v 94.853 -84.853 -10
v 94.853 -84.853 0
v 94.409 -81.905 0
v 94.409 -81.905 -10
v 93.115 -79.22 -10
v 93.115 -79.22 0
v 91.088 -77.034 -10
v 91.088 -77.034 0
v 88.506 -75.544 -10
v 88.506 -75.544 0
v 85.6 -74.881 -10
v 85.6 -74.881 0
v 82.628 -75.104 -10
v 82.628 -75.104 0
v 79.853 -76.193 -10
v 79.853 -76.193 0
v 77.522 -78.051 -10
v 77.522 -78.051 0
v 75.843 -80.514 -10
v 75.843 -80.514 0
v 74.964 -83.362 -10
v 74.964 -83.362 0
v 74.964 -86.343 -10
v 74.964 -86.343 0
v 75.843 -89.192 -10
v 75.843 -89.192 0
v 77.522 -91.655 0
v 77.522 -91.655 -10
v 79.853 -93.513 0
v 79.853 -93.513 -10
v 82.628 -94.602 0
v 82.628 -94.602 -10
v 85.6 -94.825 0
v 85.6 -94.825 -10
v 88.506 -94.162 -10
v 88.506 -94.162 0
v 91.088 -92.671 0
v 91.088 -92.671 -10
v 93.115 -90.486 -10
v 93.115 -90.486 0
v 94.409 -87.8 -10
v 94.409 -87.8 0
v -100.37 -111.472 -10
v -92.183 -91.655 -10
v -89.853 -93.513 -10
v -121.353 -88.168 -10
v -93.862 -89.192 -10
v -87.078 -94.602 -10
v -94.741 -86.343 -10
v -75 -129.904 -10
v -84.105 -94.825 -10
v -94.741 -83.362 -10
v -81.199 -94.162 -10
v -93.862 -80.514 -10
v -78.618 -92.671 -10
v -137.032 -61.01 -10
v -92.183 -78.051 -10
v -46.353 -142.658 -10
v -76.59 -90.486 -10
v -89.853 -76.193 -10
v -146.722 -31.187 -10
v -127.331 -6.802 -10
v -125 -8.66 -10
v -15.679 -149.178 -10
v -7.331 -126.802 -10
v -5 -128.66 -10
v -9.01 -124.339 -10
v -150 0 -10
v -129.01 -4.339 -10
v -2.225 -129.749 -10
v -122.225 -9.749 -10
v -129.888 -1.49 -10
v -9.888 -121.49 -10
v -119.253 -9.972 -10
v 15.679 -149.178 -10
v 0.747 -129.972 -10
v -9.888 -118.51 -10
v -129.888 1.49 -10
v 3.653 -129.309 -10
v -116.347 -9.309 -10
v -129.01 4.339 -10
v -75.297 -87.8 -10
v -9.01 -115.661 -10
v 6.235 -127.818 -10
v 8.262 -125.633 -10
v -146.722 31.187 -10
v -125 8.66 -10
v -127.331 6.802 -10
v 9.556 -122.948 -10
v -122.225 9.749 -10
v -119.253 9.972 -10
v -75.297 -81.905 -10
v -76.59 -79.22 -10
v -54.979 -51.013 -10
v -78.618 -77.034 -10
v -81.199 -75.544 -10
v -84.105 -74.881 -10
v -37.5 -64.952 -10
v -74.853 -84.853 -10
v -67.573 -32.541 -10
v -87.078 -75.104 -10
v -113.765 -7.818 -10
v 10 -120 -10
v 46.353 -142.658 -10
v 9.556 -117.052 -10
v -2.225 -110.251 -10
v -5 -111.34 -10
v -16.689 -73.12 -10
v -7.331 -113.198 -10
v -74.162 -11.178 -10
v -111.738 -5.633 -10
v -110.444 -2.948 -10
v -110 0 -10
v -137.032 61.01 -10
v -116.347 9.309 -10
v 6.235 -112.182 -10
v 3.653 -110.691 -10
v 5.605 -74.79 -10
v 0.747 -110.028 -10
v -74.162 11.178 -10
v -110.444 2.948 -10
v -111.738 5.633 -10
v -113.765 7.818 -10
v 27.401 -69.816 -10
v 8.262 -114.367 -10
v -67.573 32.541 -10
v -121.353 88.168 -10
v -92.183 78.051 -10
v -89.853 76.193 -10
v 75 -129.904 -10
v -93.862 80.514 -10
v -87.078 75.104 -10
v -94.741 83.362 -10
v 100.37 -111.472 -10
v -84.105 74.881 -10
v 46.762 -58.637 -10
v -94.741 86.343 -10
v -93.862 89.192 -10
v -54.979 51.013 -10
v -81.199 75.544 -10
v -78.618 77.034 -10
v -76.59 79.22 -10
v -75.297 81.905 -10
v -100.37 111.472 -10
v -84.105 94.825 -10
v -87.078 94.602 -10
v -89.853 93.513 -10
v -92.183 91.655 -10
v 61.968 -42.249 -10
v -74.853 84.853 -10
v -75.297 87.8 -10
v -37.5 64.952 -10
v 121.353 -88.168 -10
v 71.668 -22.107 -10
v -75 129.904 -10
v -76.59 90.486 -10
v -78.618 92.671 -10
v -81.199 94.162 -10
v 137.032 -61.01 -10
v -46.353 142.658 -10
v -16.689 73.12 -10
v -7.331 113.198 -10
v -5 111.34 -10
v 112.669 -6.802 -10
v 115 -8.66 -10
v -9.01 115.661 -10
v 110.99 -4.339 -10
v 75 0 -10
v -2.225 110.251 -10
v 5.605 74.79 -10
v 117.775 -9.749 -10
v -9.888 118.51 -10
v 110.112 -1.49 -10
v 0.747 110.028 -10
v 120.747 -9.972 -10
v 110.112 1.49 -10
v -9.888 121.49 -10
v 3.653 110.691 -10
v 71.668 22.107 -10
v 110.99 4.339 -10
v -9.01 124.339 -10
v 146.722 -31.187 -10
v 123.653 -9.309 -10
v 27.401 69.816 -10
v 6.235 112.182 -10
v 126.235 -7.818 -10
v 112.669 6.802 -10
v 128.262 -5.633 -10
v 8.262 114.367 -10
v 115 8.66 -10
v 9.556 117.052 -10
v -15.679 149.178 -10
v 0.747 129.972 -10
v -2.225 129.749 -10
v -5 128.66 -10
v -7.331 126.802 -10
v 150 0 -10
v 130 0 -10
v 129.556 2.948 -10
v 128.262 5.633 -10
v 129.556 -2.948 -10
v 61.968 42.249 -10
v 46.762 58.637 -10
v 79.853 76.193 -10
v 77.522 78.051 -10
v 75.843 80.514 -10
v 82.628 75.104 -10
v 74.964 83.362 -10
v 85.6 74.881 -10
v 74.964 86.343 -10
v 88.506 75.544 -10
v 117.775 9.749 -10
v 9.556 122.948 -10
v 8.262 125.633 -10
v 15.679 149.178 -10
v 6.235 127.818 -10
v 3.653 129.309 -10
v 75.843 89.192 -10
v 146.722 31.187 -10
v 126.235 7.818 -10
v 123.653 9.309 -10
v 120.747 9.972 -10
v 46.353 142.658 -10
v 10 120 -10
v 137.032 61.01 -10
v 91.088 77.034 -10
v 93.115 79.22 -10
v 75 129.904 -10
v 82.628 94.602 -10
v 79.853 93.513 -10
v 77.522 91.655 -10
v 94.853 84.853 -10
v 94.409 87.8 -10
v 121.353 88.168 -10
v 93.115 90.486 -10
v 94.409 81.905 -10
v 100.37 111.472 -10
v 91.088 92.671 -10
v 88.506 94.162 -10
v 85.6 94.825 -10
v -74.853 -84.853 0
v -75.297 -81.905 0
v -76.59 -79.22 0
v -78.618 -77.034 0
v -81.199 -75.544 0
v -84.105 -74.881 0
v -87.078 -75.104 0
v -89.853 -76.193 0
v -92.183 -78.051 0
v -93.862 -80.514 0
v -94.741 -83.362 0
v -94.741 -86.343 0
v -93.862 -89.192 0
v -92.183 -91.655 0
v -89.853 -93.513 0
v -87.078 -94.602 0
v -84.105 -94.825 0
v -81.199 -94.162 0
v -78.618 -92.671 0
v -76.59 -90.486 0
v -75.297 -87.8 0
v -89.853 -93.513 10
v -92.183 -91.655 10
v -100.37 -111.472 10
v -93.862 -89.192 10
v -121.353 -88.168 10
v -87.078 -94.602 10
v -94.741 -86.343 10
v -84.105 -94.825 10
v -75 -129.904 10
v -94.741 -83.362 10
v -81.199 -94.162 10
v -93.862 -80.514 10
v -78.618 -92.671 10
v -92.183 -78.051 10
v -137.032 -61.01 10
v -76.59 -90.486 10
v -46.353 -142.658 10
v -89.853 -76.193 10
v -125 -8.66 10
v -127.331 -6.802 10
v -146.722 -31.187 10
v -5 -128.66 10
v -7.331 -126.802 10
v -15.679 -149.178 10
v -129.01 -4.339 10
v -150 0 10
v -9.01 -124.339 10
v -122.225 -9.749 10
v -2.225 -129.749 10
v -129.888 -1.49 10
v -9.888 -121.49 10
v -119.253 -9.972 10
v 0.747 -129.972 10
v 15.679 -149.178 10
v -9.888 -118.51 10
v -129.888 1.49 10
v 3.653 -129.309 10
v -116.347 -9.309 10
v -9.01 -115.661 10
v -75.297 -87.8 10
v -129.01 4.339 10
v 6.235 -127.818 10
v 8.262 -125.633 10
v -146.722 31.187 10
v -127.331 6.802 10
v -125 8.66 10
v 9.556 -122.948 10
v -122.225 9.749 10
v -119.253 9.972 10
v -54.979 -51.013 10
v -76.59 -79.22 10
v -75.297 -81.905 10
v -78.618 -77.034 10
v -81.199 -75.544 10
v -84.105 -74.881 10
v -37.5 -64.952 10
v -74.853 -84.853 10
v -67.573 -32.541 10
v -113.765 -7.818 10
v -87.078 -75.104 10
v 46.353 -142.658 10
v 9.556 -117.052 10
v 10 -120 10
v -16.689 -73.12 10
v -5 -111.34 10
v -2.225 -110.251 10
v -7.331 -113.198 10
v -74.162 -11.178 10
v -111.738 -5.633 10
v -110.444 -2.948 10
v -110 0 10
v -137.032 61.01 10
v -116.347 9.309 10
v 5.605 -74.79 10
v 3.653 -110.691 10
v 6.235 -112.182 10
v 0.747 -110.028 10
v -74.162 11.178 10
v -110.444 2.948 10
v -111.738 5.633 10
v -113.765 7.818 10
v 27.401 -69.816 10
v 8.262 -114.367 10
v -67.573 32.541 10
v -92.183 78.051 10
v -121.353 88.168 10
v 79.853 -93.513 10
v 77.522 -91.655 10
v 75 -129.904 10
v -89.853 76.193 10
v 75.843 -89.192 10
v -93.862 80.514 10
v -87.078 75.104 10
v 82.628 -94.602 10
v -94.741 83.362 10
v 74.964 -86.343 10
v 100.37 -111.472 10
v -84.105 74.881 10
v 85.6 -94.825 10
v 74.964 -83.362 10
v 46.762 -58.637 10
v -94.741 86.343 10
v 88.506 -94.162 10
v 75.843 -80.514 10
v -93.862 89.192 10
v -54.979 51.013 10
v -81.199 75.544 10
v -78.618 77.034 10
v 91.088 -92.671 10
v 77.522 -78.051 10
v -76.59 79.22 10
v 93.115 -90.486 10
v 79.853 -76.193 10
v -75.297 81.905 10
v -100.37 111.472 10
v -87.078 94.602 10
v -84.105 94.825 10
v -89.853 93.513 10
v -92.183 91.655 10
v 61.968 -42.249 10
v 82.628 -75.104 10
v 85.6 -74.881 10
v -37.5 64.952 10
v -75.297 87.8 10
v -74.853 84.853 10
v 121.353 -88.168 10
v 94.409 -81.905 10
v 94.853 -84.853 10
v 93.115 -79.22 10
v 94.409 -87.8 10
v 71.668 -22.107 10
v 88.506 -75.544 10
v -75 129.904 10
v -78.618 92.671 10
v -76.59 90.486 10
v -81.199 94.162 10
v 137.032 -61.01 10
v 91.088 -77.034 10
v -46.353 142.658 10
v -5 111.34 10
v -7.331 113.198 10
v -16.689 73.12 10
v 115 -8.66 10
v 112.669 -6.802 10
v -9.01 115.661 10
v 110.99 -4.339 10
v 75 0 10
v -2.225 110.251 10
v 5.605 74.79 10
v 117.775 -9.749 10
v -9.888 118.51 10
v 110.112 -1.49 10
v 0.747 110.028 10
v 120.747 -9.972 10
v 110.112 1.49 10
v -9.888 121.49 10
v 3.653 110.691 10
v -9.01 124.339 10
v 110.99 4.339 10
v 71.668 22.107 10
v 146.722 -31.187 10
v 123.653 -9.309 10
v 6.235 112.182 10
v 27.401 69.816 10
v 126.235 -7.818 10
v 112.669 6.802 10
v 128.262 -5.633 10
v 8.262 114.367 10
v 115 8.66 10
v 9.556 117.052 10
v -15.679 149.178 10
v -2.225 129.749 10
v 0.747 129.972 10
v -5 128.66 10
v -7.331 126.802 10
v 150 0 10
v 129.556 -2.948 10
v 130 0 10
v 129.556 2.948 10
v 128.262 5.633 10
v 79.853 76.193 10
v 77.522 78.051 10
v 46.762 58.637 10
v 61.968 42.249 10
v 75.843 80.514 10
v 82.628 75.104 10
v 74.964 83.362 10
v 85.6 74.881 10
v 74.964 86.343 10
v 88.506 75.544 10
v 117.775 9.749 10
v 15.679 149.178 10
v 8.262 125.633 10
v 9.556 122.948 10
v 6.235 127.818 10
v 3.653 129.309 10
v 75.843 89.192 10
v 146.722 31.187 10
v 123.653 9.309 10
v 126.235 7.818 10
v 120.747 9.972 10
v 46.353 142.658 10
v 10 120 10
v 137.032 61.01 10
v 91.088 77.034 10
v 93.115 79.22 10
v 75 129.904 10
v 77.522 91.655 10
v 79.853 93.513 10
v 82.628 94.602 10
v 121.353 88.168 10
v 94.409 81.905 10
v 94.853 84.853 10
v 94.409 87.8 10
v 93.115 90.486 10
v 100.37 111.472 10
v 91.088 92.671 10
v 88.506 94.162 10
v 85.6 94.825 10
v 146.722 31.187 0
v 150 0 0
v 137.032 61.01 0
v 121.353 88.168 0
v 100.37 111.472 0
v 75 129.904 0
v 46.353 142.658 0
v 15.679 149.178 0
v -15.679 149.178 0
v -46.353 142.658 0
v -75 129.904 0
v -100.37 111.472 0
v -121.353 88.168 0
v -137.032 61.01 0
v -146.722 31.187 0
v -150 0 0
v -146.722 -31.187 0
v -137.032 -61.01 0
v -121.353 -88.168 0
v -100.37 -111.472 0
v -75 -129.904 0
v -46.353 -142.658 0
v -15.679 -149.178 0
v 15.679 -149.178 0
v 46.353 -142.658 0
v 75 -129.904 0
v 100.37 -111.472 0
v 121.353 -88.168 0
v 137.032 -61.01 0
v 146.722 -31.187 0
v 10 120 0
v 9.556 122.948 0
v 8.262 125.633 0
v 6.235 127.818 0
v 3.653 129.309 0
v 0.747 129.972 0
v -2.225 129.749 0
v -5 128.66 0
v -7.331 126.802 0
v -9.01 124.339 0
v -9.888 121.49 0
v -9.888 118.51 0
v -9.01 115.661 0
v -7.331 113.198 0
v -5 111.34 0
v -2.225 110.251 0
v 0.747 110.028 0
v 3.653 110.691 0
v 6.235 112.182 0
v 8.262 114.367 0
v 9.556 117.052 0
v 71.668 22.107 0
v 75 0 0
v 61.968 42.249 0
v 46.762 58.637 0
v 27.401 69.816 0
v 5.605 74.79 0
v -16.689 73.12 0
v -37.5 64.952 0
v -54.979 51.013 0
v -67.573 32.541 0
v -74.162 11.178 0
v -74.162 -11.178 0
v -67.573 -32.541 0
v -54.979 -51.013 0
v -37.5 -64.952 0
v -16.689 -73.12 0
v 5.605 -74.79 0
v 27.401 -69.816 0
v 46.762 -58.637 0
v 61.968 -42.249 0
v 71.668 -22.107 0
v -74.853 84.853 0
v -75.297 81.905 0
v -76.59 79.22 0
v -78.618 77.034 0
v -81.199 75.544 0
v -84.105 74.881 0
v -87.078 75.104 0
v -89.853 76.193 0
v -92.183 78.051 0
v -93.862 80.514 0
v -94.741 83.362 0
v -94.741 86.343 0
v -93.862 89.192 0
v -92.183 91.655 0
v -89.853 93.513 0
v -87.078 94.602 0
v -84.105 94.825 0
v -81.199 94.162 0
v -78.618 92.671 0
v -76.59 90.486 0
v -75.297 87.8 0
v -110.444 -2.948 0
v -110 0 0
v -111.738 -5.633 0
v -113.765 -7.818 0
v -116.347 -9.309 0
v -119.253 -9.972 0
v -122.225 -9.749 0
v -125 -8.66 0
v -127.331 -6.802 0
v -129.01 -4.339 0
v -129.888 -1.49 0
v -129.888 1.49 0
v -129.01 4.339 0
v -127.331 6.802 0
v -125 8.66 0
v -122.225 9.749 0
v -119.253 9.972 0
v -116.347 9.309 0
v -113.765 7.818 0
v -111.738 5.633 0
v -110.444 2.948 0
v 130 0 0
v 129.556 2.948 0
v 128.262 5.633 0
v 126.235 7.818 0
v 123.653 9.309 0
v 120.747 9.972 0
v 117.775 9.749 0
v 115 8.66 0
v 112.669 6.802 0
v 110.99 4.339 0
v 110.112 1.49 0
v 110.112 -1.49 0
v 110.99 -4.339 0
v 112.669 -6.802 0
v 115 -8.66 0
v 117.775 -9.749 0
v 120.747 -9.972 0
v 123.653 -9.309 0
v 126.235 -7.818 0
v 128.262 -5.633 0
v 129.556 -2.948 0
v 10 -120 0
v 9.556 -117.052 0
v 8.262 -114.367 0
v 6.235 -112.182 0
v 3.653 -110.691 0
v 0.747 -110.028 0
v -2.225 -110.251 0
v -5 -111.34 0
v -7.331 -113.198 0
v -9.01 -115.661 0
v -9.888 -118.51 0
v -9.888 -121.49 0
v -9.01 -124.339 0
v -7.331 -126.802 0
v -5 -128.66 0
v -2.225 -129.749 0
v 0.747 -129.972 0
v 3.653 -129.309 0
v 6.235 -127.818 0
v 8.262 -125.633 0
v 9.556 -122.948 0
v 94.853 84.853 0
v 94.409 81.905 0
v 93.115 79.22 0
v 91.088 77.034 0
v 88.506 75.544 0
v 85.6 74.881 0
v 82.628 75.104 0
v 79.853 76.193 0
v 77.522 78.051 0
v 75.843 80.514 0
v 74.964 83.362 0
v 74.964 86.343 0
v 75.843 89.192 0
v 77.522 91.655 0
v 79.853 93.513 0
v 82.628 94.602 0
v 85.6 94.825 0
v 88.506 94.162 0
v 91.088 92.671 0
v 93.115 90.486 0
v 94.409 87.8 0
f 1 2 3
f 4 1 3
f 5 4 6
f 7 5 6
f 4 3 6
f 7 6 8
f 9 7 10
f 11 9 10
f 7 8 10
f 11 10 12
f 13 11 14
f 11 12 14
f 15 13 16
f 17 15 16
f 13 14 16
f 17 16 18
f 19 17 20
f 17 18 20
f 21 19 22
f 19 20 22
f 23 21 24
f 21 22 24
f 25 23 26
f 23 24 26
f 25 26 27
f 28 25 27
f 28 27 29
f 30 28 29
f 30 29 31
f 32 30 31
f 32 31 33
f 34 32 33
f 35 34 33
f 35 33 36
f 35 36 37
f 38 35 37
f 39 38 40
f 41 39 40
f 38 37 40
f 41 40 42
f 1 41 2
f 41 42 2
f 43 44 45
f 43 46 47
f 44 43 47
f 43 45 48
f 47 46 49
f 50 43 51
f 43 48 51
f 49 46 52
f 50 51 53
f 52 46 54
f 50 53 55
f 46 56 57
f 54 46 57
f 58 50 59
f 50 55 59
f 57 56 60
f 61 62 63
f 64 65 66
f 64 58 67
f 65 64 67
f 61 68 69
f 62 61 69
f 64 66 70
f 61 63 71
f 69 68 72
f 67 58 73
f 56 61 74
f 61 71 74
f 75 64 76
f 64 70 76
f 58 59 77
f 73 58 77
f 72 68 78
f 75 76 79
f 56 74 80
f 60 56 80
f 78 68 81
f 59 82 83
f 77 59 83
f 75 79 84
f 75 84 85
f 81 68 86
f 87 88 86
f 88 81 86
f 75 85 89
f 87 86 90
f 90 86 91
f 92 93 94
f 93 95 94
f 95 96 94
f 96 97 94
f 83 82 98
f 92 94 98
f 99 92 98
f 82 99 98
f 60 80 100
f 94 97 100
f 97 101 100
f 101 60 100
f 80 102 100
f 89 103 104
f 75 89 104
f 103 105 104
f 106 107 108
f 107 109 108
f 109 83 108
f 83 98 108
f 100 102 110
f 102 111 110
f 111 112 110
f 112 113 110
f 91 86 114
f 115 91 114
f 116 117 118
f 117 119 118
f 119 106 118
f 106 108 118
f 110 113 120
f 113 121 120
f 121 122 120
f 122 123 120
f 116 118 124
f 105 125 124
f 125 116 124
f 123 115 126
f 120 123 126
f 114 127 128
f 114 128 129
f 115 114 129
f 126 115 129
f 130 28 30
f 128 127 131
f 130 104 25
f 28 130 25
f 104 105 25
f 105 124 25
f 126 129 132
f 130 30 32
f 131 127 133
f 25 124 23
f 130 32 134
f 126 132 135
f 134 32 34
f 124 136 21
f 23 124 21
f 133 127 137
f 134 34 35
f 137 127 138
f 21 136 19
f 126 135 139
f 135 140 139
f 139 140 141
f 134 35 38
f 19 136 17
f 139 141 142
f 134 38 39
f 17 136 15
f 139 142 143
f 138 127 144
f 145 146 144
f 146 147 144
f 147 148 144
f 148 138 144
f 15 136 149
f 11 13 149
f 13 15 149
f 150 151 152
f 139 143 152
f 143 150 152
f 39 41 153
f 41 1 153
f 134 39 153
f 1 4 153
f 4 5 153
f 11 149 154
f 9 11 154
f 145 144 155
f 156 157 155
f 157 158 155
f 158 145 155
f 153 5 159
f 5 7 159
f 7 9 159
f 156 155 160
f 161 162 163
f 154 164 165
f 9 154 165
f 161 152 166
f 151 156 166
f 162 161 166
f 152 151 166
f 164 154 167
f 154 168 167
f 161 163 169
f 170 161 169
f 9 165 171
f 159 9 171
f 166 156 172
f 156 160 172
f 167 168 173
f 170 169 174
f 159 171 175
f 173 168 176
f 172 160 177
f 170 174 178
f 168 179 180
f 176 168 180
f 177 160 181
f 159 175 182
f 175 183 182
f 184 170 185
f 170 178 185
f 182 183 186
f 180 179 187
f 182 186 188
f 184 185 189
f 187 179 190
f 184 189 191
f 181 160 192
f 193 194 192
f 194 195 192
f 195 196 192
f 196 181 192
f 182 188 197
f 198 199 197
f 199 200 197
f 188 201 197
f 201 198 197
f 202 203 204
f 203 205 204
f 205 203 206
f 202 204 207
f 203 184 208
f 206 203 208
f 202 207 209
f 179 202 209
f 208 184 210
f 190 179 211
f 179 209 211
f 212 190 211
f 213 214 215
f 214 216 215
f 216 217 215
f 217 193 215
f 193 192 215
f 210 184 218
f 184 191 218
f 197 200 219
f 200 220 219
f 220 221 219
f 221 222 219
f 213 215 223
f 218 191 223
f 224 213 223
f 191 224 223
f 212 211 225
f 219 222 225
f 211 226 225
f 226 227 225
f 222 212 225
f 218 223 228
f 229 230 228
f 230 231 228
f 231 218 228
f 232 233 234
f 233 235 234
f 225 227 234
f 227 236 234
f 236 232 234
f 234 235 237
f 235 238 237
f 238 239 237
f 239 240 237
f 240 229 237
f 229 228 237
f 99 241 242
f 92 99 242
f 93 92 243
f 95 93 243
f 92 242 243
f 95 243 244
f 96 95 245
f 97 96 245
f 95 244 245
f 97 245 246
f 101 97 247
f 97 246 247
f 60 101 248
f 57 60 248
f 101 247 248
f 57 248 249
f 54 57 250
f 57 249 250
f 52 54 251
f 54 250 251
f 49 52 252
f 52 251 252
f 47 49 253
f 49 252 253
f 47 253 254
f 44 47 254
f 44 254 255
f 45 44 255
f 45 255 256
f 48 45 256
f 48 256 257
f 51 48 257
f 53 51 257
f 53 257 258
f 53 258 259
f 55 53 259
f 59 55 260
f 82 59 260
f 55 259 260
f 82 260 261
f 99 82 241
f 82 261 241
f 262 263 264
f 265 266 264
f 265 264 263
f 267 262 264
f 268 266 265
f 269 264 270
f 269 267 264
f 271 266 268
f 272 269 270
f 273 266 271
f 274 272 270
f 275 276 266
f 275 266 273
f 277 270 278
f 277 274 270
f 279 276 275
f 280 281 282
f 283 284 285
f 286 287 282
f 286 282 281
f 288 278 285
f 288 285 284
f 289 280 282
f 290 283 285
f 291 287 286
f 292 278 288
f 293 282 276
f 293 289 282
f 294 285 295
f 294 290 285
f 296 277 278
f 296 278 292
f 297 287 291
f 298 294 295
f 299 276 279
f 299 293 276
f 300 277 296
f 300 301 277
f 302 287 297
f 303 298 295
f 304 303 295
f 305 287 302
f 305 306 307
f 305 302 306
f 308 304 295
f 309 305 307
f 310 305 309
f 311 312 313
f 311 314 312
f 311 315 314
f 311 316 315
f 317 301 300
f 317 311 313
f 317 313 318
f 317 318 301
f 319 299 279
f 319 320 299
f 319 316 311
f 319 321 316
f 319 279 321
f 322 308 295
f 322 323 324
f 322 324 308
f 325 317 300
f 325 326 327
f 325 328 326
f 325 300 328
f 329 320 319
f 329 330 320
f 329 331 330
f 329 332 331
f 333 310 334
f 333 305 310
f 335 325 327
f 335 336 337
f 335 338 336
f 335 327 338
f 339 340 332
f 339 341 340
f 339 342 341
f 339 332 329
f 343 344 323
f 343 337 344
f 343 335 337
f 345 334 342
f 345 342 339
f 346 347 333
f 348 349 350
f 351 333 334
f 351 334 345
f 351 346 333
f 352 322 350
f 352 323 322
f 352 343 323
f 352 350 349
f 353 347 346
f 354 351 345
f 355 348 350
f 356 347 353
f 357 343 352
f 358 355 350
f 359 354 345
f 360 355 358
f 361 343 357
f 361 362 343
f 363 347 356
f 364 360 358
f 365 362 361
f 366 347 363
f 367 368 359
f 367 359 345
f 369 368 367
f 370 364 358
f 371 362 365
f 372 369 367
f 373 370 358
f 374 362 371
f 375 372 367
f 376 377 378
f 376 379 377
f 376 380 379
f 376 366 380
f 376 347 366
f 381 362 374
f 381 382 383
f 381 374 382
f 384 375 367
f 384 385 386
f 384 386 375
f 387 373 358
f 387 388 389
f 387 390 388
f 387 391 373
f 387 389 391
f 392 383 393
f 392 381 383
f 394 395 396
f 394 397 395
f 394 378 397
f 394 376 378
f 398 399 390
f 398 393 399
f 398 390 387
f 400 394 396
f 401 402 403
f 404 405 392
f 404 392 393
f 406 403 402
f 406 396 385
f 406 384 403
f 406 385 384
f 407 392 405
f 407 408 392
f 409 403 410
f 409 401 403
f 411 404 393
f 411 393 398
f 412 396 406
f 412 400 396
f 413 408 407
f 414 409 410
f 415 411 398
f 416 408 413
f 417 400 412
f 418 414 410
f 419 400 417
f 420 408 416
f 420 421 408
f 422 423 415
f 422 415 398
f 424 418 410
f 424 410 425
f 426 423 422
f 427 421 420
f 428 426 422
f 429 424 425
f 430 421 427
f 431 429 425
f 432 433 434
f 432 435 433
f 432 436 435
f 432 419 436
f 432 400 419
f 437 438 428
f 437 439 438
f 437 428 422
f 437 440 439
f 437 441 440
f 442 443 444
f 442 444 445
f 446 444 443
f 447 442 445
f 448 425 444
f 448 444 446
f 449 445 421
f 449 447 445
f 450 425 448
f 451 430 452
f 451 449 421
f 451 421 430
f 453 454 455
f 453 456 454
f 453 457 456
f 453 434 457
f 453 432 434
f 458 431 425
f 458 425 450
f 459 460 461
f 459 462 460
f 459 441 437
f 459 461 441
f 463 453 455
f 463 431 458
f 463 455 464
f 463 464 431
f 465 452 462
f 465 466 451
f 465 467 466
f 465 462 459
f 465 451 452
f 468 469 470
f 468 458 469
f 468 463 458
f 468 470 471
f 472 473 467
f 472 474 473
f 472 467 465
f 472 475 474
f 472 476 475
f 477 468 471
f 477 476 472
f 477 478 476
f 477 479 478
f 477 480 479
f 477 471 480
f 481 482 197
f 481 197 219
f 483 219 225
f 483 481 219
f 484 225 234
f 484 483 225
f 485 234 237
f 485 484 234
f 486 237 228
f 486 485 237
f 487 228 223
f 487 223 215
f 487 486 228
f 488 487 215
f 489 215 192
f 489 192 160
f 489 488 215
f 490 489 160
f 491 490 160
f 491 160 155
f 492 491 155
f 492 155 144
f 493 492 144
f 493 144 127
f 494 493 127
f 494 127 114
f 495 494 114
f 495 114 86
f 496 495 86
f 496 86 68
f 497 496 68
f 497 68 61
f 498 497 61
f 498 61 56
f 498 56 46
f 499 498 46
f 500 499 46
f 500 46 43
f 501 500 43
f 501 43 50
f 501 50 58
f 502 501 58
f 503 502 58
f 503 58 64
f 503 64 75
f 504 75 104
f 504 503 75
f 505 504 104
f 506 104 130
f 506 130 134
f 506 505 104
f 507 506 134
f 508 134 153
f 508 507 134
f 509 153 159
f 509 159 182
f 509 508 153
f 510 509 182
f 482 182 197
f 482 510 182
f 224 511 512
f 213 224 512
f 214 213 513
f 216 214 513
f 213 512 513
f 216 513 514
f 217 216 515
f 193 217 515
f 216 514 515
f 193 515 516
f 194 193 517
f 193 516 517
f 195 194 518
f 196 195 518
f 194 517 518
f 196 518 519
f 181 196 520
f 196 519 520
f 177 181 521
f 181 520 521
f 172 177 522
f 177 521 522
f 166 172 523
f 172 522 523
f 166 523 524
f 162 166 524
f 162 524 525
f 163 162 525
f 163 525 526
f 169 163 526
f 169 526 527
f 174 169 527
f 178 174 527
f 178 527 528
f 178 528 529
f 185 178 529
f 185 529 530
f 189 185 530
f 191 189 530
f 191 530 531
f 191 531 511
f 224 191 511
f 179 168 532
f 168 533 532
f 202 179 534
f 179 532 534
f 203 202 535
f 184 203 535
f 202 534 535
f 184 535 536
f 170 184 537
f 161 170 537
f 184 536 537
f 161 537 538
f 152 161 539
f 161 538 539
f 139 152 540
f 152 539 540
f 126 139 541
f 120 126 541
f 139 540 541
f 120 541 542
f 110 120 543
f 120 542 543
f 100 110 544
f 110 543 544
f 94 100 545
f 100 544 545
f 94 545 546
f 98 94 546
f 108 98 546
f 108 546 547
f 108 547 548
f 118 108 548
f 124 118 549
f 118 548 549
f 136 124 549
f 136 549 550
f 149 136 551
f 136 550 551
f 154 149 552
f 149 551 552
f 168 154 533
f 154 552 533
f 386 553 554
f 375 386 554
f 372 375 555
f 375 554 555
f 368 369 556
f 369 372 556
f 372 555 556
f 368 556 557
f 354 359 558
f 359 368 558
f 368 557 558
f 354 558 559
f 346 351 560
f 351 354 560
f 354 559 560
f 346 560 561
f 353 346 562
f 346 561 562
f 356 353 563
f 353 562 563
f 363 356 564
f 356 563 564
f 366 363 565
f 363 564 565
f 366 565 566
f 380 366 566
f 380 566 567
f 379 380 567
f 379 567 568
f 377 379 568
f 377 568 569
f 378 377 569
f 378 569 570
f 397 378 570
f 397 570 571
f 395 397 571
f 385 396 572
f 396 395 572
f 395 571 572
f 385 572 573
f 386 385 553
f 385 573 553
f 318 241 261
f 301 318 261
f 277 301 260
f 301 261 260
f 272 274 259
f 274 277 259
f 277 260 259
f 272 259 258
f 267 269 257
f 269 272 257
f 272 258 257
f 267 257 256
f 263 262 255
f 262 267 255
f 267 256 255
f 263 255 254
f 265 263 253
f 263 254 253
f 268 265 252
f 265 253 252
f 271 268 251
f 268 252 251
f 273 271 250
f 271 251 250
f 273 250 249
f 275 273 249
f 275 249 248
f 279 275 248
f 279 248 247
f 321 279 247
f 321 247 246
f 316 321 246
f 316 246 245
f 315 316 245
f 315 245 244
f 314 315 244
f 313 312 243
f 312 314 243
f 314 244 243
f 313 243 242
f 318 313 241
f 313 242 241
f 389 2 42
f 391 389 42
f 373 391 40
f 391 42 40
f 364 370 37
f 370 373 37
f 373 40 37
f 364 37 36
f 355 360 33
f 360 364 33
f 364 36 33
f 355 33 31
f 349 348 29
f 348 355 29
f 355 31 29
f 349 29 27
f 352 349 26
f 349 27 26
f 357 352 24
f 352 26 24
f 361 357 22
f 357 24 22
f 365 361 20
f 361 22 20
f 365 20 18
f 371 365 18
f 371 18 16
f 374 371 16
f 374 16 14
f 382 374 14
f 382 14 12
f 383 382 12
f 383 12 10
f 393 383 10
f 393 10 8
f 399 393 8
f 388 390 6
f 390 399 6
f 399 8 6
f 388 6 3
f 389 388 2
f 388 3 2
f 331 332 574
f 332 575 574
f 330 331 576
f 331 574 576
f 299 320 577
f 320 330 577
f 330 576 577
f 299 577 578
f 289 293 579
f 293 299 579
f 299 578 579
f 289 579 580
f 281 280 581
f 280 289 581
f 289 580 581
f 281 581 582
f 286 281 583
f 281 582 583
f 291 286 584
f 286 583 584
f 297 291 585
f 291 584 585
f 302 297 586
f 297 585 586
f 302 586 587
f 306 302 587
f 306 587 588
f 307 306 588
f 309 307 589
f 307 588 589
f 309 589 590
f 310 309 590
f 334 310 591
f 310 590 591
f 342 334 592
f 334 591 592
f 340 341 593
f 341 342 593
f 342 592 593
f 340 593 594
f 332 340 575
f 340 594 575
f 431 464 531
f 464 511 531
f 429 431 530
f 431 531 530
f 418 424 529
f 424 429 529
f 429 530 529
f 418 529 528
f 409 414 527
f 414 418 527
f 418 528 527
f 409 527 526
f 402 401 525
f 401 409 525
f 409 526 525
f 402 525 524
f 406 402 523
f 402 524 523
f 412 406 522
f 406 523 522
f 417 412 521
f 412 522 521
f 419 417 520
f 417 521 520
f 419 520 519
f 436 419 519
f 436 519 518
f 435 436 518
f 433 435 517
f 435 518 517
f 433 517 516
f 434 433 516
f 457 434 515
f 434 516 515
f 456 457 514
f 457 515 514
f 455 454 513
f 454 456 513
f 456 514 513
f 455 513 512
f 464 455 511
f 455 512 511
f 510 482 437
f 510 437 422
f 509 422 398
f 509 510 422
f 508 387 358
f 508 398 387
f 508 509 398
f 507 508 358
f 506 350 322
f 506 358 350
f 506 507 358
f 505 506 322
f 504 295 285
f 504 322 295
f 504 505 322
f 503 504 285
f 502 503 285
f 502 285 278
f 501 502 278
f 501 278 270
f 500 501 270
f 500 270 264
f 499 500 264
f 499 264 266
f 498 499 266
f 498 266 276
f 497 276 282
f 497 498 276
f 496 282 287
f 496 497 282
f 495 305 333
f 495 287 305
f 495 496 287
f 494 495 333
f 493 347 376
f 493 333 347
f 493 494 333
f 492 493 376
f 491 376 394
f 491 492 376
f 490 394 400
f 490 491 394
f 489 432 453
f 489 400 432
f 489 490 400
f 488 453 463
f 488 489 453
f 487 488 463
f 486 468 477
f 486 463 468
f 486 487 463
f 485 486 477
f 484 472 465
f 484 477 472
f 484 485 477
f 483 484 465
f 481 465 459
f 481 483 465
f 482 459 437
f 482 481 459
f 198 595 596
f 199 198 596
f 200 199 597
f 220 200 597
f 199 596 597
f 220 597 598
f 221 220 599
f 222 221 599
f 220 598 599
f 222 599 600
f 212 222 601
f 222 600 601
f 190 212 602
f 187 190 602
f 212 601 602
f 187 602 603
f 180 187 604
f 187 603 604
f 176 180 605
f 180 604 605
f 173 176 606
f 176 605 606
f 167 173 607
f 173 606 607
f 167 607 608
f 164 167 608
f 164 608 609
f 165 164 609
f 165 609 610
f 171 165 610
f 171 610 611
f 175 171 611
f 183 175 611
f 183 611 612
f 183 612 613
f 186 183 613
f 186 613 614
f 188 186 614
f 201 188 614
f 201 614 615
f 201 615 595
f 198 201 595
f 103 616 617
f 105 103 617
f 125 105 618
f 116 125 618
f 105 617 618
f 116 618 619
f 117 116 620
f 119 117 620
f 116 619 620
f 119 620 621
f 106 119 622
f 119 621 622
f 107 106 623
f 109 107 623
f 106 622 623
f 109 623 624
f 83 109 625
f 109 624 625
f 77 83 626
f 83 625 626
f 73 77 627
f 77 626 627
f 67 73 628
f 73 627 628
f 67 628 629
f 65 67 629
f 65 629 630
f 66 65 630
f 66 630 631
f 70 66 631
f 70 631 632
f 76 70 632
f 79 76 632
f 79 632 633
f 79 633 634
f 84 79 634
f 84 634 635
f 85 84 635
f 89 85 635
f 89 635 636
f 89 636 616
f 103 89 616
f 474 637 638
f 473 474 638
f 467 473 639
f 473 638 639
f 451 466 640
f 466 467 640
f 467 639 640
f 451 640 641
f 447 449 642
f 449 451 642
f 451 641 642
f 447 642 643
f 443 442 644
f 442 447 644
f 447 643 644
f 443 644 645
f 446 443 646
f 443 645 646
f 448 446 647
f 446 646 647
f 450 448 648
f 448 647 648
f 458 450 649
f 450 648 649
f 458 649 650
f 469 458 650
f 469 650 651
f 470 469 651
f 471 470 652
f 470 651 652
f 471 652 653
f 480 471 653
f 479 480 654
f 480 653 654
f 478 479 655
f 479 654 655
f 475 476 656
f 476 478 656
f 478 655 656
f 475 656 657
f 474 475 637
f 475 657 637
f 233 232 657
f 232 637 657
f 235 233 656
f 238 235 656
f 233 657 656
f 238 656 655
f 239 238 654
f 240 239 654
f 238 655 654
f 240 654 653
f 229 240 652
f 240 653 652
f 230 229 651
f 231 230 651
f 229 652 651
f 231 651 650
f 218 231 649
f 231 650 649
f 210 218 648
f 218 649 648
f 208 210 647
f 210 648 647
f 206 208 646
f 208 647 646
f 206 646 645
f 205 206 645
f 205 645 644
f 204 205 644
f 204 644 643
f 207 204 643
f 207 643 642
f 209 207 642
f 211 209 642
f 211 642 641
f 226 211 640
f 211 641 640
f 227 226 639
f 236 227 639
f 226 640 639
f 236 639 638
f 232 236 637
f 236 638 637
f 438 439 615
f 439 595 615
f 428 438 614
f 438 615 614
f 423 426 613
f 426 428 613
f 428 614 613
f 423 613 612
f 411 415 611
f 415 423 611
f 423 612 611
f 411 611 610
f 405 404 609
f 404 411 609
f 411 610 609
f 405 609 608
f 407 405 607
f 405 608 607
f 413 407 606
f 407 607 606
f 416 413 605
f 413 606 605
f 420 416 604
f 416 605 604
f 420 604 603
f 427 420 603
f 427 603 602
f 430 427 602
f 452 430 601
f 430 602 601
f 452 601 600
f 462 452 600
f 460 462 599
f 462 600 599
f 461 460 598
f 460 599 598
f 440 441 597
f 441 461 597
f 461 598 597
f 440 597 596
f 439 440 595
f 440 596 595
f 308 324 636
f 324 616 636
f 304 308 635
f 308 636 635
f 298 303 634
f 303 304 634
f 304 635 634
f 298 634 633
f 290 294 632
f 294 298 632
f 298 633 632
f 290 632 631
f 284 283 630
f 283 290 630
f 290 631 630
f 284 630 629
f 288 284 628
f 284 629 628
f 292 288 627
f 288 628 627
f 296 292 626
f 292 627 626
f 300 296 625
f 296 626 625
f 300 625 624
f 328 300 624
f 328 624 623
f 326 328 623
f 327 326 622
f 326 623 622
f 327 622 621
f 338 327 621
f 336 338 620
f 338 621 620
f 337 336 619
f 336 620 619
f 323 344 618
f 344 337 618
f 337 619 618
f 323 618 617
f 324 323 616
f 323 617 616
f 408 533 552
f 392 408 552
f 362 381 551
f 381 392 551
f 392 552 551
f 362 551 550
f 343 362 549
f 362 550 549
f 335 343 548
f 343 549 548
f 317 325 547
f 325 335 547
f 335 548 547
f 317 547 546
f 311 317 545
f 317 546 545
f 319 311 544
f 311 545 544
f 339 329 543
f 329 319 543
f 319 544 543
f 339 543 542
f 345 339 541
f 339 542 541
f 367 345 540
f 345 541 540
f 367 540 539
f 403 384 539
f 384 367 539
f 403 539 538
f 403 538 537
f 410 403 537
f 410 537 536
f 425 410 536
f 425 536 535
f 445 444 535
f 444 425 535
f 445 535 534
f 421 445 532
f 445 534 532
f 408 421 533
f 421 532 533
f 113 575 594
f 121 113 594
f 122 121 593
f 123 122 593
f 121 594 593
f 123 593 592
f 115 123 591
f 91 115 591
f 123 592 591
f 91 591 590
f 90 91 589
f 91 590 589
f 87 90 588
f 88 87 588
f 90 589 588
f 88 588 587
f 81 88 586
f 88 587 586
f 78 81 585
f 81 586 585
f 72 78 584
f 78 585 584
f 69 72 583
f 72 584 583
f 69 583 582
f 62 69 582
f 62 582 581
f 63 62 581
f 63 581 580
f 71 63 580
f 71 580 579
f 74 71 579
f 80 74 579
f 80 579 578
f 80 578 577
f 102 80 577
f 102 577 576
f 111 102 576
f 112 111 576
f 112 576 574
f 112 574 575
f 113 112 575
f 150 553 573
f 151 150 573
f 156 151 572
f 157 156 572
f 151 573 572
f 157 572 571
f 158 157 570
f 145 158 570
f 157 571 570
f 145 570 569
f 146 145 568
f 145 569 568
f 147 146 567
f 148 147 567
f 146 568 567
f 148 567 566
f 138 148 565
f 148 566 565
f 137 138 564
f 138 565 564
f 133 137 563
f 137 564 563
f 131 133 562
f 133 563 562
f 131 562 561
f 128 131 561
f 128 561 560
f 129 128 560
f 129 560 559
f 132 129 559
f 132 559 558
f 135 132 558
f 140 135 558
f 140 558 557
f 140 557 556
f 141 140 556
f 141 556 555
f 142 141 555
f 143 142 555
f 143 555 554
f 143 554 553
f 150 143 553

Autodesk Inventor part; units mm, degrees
ref_plane "YZ Plane" through (0, 0, 0) normal (1, 0, 0) x (0, 1, 0)
ref_plane "XZ Plane" through (0, 0, 0) normal (0, 1, 0) x (-1, 0, 0)
ref_plane "XY Plane" through (0, 0, 0) normal (0, 0, 1) x (1, 0, 0)
sketch "Schizzo1" plane through (0, 0, 0) normal (0, 0, 1) x (1, 0, 0)
  circle A0 centre (0, 0) radius 150
  circle A1 centre (0, 0) radius 75
  circle A2 centre (-120, 0) radius 10
  circle A3 centre (-84.8528, 84.8528) radius 10
  circle A4 centre (0, 120) radius 10
  circle A5 centre (84.8528, 84.8528) radius 10
  circle A6 centre (120, 0) radius 10
  circle A7 centre (84.8528, -84.8528) radius 10
  circle A8 centre (0, -120) radius 10
  circle A9 centre (-84.8528, -84.8528) radius 10
  dimension "d0" = 150
  dimension "d1" = 300
  dimension "d2" = 20
  dimension "d5" = 360
  dimension "d9" = 120
extrude "Estrusione1" add sketch "Schizzo1" along normal mid plane 20
properties part number "05-22-2023 flangia"
